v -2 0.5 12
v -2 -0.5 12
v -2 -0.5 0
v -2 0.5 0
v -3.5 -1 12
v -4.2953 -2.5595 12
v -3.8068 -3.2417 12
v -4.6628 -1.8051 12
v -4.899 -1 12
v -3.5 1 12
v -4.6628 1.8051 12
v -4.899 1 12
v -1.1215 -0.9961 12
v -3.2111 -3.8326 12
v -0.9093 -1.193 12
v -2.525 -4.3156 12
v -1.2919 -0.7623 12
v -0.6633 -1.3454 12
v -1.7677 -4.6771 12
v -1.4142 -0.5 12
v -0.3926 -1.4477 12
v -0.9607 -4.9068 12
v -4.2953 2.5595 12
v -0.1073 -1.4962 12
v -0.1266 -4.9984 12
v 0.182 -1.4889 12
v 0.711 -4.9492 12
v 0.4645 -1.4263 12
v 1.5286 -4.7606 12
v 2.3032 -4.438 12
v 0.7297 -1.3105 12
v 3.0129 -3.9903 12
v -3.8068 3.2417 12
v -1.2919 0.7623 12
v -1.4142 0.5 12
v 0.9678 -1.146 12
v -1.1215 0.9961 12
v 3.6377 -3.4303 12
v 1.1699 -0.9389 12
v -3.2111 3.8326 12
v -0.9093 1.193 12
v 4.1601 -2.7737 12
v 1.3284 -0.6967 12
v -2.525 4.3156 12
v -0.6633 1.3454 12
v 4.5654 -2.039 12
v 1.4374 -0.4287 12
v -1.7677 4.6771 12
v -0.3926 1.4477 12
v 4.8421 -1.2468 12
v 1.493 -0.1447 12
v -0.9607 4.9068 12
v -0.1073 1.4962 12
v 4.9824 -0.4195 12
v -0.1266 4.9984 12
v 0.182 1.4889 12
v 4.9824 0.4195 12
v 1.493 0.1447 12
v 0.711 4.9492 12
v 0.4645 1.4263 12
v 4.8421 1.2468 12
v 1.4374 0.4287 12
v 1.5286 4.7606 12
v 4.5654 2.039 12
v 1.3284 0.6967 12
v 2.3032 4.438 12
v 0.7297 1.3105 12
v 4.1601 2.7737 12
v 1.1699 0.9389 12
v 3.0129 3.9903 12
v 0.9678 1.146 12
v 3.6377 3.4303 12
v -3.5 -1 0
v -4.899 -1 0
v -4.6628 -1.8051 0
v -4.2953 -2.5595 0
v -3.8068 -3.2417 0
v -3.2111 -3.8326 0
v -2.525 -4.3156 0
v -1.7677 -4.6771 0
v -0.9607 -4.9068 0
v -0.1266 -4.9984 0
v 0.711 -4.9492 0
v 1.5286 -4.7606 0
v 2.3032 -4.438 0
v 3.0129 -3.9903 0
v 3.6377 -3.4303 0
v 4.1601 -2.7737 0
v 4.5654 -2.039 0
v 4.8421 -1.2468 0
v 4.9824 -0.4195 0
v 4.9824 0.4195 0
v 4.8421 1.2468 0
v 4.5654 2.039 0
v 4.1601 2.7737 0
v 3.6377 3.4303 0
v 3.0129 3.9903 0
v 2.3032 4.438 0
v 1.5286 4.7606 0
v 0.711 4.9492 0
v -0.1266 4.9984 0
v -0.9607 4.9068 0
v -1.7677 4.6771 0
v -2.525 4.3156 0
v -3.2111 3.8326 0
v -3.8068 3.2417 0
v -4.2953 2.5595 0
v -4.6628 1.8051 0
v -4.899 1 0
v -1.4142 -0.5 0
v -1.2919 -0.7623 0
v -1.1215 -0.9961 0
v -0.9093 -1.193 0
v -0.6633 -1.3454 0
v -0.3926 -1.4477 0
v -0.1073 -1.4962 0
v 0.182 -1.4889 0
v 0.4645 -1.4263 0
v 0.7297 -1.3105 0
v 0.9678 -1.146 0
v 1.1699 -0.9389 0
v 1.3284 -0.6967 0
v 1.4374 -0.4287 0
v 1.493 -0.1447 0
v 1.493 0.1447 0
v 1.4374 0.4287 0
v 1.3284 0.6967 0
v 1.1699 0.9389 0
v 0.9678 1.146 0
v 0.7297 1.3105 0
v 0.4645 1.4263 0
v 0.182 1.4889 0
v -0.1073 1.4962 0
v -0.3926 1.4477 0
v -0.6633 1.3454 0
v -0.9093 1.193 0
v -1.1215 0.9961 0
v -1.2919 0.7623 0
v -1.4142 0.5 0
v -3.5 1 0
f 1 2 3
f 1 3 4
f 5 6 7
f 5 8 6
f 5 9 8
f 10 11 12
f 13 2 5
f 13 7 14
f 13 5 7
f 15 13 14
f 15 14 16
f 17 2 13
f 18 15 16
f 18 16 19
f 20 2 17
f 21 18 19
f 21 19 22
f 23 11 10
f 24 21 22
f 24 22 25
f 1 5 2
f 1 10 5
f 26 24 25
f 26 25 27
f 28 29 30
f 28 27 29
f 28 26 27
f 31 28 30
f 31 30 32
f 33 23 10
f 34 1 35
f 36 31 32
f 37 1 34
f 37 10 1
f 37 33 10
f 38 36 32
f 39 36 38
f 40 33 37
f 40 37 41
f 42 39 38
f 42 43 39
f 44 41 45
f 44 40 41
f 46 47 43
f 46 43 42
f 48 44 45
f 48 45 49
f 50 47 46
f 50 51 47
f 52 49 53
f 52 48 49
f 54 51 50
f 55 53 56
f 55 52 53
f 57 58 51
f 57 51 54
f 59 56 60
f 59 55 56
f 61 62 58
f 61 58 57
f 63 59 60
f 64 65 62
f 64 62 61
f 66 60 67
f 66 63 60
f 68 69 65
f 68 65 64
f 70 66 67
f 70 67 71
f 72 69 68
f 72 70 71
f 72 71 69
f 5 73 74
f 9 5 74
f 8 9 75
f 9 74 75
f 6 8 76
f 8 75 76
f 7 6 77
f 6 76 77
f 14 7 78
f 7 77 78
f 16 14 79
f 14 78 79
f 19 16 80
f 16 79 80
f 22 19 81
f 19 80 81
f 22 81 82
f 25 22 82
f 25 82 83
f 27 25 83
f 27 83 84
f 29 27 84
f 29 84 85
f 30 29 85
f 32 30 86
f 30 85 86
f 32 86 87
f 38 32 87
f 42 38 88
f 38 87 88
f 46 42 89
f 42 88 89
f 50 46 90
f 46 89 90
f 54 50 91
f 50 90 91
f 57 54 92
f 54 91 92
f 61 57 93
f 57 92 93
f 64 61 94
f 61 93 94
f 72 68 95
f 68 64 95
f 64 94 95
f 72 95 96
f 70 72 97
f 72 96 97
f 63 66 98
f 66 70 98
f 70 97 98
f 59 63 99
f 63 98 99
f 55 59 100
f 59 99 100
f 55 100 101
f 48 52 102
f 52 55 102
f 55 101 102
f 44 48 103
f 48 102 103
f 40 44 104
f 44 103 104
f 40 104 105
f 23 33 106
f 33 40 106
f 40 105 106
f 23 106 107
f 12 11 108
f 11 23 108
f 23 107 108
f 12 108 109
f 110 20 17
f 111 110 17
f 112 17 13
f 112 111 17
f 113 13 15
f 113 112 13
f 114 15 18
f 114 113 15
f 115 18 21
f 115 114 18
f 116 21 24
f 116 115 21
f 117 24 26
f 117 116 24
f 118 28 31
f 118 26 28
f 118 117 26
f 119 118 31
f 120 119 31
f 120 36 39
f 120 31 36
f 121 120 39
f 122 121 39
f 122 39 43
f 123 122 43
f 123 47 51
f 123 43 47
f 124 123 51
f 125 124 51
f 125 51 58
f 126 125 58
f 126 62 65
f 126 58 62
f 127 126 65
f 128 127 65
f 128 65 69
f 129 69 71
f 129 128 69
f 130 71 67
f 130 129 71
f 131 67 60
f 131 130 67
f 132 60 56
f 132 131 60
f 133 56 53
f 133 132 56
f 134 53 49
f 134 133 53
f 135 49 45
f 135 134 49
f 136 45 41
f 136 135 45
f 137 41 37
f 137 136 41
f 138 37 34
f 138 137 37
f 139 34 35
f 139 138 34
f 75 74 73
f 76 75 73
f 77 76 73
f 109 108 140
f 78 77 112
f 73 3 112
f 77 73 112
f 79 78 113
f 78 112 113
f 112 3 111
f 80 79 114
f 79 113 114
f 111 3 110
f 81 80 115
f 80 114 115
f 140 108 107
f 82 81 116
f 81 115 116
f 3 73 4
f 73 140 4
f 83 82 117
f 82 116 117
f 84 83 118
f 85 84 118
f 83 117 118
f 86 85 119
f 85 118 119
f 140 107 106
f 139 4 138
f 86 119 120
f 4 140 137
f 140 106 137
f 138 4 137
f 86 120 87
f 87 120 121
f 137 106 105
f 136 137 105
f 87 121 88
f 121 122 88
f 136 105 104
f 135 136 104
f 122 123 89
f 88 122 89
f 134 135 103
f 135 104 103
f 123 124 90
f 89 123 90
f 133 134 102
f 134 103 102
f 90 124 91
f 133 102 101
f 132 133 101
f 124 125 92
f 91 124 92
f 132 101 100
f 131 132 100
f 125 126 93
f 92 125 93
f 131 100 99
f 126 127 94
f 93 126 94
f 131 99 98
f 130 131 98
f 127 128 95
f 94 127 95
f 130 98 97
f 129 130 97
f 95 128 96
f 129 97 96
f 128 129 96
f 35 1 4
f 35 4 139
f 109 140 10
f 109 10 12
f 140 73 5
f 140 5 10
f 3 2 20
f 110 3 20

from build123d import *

# Parameters (mm, degrees)
SKETCH5_R           = 5
SKETCH5_R_2         = 1.5
BOSS_EXTRUDE2_DEPTH = 12
SKETCH6_W           = 1
SKETCH6_H           = 1
CUT_EXTRUDE4_DEPTH  = 12
SKETCH7_W           = 1
SKETCH7_H           = 1
CUT_EXTRUDE6_DEPTH  = 4
SKETCH8_W           = 3
SKETCH8_H           = 2
CUT_EXTRUDE7_DEPTH  = 15


with BuildPart() as part:
    # Sketch5 → Boss-Extrude2 (new body)
    with BuildSketch(Plane.XY):
        Circle(SKETCH5_R)
        Circle(SKETCH5_R_2, mode=Mode.SUBTRACT)
    extrude(amount=BOSS_EXTRUDE2_DEPTH)

    # Sketch6 → Cut-Extrude4 (cut)
    with BuildSketch(Plane.XY.offset(12)):
        with Locations((-1.5, 0)):
            Rectangle(SKETCH6_W, SKETCH6_H)
    extrude(amount=-CUT_EXTRUDE4_DEPTH, mode=Mode.SUBTRACT)

    # Sketch7 → Cut-Extrude6 (cut)
    with BuildSketch(Plane.XY.offset(12)):
        with Locations((-5, 0)):
            Rectangle(SKETCH7_W, SKETCH7_H)
    extrude(amount=-CUT_EXTRUDE6_DEPTH, mode=Mode.SUBTRACT)

    # Sketch8 → Cut-Extrude7 (cut)
    with BuildSketch(Plane(origin=(0, 0, 0), x_dir=(-1, 0, 0), z_dir=(0, 0, -1))):
        with Locations((5, 0)):
            Rectangle(SKETCH8_W, SKETCH8_H)
    extrude(amount=-CUT_EXTRUDE7_DEPTH, mode=Mode.SUBTRACT)


solid = part.part
